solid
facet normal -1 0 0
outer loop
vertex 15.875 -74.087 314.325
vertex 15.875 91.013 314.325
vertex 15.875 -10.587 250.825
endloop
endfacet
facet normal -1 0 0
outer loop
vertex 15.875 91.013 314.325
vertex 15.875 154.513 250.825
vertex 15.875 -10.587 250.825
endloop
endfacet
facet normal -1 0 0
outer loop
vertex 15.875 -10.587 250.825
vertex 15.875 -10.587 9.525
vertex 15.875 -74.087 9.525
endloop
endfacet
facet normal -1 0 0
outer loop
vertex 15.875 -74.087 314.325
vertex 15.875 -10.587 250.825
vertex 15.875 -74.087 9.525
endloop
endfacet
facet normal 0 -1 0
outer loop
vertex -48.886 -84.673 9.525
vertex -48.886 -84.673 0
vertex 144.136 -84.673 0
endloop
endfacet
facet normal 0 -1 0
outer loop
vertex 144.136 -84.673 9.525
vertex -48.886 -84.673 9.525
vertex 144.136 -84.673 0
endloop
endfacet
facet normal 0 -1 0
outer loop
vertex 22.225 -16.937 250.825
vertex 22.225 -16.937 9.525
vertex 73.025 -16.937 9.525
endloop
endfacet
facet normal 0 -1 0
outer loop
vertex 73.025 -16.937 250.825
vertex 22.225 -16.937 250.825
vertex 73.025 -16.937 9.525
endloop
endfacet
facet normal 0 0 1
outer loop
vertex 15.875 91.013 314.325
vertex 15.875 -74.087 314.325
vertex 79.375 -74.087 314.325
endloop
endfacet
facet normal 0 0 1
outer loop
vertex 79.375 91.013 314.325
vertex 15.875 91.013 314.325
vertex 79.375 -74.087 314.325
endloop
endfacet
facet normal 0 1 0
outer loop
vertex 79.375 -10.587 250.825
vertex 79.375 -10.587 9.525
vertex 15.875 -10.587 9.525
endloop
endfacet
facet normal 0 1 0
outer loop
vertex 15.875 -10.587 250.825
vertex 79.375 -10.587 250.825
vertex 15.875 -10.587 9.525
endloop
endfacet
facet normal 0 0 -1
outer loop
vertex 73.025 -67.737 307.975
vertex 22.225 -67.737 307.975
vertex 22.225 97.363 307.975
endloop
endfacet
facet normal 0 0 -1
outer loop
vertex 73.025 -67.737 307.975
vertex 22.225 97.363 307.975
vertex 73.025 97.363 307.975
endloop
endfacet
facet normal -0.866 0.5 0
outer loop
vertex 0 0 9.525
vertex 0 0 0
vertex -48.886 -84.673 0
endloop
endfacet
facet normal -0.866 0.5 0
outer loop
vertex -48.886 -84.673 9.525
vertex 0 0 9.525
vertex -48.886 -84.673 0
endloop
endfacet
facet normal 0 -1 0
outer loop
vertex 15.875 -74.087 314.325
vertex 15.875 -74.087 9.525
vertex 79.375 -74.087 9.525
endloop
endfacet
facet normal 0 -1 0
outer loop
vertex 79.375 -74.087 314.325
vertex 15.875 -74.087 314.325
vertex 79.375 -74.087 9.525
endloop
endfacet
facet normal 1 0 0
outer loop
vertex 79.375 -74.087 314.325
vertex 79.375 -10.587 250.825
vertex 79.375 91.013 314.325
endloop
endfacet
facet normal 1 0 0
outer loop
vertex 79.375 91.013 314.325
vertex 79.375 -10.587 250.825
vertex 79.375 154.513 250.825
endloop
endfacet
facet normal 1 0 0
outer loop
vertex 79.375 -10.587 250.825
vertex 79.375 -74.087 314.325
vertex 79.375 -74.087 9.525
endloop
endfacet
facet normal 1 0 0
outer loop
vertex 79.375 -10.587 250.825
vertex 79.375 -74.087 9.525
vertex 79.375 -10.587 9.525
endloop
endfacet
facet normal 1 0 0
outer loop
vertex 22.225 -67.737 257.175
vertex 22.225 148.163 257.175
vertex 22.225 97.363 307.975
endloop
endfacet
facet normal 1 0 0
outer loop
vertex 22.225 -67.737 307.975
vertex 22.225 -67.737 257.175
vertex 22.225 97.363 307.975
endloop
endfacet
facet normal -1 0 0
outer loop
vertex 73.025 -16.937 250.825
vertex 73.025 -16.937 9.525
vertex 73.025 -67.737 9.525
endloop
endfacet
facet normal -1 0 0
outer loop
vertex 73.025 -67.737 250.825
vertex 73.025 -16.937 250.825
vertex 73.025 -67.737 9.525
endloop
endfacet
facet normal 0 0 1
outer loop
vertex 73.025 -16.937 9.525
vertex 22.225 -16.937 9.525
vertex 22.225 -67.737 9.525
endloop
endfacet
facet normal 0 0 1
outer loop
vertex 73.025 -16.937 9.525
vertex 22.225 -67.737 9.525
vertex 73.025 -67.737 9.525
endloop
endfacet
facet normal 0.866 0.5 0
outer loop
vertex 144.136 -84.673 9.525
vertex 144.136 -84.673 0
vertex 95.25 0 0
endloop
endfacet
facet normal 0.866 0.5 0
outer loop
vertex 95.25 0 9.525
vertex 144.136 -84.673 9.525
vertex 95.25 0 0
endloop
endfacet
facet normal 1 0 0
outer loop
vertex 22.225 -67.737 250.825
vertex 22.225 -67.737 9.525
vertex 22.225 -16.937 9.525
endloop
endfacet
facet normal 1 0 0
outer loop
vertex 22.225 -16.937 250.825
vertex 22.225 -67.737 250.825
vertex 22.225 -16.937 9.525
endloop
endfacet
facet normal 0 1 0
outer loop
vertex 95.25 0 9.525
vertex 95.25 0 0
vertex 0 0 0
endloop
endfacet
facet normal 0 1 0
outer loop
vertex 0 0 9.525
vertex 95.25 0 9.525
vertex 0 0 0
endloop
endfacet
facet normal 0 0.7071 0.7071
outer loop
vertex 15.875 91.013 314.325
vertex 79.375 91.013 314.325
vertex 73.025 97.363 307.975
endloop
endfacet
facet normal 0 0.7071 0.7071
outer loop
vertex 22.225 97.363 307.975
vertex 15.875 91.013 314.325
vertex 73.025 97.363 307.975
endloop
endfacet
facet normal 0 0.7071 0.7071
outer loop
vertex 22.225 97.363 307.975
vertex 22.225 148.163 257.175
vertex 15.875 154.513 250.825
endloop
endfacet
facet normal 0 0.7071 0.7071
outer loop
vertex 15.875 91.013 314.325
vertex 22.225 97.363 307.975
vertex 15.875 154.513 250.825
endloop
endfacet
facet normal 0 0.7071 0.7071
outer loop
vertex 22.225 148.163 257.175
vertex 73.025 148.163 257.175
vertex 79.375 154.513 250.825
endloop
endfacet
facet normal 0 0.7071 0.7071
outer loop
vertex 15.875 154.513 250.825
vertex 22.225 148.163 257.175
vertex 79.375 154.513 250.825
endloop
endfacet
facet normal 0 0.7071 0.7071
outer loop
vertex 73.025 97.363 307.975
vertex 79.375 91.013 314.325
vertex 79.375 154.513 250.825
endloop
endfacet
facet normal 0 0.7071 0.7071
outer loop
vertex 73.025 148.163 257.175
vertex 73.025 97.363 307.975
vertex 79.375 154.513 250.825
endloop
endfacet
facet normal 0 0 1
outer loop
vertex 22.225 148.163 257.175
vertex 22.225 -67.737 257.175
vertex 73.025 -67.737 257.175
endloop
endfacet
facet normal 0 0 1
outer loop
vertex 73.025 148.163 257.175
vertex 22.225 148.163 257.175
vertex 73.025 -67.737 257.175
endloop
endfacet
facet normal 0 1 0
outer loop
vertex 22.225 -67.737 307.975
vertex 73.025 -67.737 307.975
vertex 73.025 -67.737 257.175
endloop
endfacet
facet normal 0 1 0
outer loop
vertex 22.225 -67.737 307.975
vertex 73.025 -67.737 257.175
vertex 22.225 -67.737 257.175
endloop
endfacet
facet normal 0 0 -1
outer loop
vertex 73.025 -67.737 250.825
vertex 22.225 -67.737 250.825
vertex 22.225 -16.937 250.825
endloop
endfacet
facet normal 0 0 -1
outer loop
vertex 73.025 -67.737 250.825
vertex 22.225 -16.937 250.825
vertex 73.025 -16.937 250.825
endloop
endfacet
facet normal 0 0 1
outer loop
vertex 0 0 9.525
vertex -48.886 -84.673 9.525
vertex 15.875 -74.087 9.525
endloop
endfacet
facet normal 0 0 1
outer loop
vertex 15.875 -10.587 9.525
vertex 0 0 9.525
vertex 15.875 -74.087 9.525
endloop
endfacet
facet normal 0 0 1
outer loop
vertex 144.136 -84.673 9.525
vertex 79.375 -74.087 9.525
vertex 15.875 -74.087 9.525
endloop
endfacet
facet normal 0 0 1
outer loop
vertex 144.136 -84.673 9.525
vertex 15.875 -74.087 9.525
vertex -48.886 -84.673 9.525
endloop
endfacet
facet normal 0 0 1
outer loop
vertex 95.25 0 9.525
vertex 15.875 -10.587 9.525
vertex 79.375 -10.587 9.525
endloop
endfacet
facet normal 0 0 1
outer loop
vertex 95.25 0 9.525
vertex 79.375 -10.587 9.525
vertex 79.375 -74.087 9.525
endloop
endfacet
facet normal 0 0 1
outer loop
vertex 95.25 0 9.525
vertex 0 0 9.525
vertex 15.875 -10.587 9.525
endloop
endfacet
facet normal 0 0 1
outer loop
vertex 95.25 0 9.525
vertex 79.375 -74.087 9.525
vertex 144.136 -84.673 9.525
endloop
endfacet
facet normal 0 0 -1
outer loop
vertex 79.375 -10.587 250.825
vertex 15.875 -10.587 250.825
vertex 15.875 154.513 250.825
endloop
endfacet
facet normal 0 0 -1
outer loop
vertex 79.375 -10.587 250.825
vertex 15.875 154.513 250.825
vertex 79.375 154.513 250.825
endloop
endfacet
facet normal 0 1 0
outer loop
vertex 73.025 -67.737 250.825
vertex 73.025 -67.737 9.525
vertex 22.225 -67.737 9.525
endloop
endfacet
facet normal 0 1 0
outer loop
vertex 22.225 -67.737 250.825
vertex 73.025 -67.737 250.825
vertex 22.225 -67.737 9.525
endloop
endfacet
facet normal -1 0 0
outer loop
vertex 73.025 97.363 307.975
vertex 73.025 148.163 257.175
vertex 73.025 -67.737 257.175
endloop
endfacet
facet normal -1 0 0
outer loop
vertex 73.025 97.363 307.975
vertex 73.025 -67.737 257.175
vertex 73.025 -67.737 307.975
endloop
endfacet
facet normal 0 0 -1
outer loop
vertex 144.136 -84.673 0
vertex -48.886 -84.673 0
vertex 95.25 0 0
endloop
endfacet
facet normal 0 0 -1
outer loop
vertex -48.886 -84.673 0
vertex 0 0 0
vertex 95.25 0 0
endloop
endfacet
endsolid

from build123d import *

# Parameters (mm, degrees)
F2_DEPTH  = 9.525
F4_DEPTH  = 304.8
F6_DEPTH  = 63.5
F8_W      = 63.5
F8_H      = 63.5
F8_W_2    = 50.8
F8_H_2    = 50.8
F9_DEPTH  = 228.6
F11_DEPTH = 128.262011


with BuildPart() as f2:
    # F1 (on face) → F2 (new body)
    with BuildSketch(Plane.XY):
        Polygon((-48.886011, -84.673055), (144.136011, -84.673055), (95.25, 0), (0, 0), align=None)
    extrude(amount=F2_DEPTH)

    # F3 (on face) → F4 (join)
    with BuildSketch(Plane.XY.offset(9.525)):
        Polygon((79.375, -10.586528), (47.625, -10.586528), (47.625, -16.936528), (73.025, -16.936528), (73.025, -67.736528), (47.625, -67.736528), (47.625, -74.086528), (79.375, -74.086528), align=None)
        Polygon((47.625, -16.936528), (47.625, -10.586528), (15.875, -10.586528), (15.875, -74.086528), (47.625, -74.086528), (47.625, -67.736528), (22.225, -67.736528), (22.225, -16.936528), align=None)
    extrude(amount=F4_DEPTH)

    # F5 (on face) → F6 (cut)
    with BuildSketch(Plane.YZ.offset(79.375)):
        Polygon((-10.586528, 314.325), (-74.086528, 314.325), (-10.586528, 250.825), align=None)
    extrude(amount=-F6_DEPTH, mode=Mode.SUBTRACT)

    # F8 (on face) → F9 (join)
    with BuildSketch(Plane.XZ.offset(74.086528)):
        with Locations((47.625, 282.575)):
            Rectangle(F8_W, F8_H)
        with Locations((47.625, 282.575)):
            Rectangle(F8_W_2, F8_H_2, mode=Mode.SUBTRACT)
    extrude(amount=-F9_DEPTH)

    # F10 (on face) → F11 (cut, through all)
    with BuildSketch(Plane.YZ.offset(79.375)):
        Polygon((91.013472, 314.325), (154.513472, 250.825), (154.513472, 314.325), align=None)
    extrude(amount=-F11_DEPTH, mode=Mode.SUBTRACT)


solid = f2.part
